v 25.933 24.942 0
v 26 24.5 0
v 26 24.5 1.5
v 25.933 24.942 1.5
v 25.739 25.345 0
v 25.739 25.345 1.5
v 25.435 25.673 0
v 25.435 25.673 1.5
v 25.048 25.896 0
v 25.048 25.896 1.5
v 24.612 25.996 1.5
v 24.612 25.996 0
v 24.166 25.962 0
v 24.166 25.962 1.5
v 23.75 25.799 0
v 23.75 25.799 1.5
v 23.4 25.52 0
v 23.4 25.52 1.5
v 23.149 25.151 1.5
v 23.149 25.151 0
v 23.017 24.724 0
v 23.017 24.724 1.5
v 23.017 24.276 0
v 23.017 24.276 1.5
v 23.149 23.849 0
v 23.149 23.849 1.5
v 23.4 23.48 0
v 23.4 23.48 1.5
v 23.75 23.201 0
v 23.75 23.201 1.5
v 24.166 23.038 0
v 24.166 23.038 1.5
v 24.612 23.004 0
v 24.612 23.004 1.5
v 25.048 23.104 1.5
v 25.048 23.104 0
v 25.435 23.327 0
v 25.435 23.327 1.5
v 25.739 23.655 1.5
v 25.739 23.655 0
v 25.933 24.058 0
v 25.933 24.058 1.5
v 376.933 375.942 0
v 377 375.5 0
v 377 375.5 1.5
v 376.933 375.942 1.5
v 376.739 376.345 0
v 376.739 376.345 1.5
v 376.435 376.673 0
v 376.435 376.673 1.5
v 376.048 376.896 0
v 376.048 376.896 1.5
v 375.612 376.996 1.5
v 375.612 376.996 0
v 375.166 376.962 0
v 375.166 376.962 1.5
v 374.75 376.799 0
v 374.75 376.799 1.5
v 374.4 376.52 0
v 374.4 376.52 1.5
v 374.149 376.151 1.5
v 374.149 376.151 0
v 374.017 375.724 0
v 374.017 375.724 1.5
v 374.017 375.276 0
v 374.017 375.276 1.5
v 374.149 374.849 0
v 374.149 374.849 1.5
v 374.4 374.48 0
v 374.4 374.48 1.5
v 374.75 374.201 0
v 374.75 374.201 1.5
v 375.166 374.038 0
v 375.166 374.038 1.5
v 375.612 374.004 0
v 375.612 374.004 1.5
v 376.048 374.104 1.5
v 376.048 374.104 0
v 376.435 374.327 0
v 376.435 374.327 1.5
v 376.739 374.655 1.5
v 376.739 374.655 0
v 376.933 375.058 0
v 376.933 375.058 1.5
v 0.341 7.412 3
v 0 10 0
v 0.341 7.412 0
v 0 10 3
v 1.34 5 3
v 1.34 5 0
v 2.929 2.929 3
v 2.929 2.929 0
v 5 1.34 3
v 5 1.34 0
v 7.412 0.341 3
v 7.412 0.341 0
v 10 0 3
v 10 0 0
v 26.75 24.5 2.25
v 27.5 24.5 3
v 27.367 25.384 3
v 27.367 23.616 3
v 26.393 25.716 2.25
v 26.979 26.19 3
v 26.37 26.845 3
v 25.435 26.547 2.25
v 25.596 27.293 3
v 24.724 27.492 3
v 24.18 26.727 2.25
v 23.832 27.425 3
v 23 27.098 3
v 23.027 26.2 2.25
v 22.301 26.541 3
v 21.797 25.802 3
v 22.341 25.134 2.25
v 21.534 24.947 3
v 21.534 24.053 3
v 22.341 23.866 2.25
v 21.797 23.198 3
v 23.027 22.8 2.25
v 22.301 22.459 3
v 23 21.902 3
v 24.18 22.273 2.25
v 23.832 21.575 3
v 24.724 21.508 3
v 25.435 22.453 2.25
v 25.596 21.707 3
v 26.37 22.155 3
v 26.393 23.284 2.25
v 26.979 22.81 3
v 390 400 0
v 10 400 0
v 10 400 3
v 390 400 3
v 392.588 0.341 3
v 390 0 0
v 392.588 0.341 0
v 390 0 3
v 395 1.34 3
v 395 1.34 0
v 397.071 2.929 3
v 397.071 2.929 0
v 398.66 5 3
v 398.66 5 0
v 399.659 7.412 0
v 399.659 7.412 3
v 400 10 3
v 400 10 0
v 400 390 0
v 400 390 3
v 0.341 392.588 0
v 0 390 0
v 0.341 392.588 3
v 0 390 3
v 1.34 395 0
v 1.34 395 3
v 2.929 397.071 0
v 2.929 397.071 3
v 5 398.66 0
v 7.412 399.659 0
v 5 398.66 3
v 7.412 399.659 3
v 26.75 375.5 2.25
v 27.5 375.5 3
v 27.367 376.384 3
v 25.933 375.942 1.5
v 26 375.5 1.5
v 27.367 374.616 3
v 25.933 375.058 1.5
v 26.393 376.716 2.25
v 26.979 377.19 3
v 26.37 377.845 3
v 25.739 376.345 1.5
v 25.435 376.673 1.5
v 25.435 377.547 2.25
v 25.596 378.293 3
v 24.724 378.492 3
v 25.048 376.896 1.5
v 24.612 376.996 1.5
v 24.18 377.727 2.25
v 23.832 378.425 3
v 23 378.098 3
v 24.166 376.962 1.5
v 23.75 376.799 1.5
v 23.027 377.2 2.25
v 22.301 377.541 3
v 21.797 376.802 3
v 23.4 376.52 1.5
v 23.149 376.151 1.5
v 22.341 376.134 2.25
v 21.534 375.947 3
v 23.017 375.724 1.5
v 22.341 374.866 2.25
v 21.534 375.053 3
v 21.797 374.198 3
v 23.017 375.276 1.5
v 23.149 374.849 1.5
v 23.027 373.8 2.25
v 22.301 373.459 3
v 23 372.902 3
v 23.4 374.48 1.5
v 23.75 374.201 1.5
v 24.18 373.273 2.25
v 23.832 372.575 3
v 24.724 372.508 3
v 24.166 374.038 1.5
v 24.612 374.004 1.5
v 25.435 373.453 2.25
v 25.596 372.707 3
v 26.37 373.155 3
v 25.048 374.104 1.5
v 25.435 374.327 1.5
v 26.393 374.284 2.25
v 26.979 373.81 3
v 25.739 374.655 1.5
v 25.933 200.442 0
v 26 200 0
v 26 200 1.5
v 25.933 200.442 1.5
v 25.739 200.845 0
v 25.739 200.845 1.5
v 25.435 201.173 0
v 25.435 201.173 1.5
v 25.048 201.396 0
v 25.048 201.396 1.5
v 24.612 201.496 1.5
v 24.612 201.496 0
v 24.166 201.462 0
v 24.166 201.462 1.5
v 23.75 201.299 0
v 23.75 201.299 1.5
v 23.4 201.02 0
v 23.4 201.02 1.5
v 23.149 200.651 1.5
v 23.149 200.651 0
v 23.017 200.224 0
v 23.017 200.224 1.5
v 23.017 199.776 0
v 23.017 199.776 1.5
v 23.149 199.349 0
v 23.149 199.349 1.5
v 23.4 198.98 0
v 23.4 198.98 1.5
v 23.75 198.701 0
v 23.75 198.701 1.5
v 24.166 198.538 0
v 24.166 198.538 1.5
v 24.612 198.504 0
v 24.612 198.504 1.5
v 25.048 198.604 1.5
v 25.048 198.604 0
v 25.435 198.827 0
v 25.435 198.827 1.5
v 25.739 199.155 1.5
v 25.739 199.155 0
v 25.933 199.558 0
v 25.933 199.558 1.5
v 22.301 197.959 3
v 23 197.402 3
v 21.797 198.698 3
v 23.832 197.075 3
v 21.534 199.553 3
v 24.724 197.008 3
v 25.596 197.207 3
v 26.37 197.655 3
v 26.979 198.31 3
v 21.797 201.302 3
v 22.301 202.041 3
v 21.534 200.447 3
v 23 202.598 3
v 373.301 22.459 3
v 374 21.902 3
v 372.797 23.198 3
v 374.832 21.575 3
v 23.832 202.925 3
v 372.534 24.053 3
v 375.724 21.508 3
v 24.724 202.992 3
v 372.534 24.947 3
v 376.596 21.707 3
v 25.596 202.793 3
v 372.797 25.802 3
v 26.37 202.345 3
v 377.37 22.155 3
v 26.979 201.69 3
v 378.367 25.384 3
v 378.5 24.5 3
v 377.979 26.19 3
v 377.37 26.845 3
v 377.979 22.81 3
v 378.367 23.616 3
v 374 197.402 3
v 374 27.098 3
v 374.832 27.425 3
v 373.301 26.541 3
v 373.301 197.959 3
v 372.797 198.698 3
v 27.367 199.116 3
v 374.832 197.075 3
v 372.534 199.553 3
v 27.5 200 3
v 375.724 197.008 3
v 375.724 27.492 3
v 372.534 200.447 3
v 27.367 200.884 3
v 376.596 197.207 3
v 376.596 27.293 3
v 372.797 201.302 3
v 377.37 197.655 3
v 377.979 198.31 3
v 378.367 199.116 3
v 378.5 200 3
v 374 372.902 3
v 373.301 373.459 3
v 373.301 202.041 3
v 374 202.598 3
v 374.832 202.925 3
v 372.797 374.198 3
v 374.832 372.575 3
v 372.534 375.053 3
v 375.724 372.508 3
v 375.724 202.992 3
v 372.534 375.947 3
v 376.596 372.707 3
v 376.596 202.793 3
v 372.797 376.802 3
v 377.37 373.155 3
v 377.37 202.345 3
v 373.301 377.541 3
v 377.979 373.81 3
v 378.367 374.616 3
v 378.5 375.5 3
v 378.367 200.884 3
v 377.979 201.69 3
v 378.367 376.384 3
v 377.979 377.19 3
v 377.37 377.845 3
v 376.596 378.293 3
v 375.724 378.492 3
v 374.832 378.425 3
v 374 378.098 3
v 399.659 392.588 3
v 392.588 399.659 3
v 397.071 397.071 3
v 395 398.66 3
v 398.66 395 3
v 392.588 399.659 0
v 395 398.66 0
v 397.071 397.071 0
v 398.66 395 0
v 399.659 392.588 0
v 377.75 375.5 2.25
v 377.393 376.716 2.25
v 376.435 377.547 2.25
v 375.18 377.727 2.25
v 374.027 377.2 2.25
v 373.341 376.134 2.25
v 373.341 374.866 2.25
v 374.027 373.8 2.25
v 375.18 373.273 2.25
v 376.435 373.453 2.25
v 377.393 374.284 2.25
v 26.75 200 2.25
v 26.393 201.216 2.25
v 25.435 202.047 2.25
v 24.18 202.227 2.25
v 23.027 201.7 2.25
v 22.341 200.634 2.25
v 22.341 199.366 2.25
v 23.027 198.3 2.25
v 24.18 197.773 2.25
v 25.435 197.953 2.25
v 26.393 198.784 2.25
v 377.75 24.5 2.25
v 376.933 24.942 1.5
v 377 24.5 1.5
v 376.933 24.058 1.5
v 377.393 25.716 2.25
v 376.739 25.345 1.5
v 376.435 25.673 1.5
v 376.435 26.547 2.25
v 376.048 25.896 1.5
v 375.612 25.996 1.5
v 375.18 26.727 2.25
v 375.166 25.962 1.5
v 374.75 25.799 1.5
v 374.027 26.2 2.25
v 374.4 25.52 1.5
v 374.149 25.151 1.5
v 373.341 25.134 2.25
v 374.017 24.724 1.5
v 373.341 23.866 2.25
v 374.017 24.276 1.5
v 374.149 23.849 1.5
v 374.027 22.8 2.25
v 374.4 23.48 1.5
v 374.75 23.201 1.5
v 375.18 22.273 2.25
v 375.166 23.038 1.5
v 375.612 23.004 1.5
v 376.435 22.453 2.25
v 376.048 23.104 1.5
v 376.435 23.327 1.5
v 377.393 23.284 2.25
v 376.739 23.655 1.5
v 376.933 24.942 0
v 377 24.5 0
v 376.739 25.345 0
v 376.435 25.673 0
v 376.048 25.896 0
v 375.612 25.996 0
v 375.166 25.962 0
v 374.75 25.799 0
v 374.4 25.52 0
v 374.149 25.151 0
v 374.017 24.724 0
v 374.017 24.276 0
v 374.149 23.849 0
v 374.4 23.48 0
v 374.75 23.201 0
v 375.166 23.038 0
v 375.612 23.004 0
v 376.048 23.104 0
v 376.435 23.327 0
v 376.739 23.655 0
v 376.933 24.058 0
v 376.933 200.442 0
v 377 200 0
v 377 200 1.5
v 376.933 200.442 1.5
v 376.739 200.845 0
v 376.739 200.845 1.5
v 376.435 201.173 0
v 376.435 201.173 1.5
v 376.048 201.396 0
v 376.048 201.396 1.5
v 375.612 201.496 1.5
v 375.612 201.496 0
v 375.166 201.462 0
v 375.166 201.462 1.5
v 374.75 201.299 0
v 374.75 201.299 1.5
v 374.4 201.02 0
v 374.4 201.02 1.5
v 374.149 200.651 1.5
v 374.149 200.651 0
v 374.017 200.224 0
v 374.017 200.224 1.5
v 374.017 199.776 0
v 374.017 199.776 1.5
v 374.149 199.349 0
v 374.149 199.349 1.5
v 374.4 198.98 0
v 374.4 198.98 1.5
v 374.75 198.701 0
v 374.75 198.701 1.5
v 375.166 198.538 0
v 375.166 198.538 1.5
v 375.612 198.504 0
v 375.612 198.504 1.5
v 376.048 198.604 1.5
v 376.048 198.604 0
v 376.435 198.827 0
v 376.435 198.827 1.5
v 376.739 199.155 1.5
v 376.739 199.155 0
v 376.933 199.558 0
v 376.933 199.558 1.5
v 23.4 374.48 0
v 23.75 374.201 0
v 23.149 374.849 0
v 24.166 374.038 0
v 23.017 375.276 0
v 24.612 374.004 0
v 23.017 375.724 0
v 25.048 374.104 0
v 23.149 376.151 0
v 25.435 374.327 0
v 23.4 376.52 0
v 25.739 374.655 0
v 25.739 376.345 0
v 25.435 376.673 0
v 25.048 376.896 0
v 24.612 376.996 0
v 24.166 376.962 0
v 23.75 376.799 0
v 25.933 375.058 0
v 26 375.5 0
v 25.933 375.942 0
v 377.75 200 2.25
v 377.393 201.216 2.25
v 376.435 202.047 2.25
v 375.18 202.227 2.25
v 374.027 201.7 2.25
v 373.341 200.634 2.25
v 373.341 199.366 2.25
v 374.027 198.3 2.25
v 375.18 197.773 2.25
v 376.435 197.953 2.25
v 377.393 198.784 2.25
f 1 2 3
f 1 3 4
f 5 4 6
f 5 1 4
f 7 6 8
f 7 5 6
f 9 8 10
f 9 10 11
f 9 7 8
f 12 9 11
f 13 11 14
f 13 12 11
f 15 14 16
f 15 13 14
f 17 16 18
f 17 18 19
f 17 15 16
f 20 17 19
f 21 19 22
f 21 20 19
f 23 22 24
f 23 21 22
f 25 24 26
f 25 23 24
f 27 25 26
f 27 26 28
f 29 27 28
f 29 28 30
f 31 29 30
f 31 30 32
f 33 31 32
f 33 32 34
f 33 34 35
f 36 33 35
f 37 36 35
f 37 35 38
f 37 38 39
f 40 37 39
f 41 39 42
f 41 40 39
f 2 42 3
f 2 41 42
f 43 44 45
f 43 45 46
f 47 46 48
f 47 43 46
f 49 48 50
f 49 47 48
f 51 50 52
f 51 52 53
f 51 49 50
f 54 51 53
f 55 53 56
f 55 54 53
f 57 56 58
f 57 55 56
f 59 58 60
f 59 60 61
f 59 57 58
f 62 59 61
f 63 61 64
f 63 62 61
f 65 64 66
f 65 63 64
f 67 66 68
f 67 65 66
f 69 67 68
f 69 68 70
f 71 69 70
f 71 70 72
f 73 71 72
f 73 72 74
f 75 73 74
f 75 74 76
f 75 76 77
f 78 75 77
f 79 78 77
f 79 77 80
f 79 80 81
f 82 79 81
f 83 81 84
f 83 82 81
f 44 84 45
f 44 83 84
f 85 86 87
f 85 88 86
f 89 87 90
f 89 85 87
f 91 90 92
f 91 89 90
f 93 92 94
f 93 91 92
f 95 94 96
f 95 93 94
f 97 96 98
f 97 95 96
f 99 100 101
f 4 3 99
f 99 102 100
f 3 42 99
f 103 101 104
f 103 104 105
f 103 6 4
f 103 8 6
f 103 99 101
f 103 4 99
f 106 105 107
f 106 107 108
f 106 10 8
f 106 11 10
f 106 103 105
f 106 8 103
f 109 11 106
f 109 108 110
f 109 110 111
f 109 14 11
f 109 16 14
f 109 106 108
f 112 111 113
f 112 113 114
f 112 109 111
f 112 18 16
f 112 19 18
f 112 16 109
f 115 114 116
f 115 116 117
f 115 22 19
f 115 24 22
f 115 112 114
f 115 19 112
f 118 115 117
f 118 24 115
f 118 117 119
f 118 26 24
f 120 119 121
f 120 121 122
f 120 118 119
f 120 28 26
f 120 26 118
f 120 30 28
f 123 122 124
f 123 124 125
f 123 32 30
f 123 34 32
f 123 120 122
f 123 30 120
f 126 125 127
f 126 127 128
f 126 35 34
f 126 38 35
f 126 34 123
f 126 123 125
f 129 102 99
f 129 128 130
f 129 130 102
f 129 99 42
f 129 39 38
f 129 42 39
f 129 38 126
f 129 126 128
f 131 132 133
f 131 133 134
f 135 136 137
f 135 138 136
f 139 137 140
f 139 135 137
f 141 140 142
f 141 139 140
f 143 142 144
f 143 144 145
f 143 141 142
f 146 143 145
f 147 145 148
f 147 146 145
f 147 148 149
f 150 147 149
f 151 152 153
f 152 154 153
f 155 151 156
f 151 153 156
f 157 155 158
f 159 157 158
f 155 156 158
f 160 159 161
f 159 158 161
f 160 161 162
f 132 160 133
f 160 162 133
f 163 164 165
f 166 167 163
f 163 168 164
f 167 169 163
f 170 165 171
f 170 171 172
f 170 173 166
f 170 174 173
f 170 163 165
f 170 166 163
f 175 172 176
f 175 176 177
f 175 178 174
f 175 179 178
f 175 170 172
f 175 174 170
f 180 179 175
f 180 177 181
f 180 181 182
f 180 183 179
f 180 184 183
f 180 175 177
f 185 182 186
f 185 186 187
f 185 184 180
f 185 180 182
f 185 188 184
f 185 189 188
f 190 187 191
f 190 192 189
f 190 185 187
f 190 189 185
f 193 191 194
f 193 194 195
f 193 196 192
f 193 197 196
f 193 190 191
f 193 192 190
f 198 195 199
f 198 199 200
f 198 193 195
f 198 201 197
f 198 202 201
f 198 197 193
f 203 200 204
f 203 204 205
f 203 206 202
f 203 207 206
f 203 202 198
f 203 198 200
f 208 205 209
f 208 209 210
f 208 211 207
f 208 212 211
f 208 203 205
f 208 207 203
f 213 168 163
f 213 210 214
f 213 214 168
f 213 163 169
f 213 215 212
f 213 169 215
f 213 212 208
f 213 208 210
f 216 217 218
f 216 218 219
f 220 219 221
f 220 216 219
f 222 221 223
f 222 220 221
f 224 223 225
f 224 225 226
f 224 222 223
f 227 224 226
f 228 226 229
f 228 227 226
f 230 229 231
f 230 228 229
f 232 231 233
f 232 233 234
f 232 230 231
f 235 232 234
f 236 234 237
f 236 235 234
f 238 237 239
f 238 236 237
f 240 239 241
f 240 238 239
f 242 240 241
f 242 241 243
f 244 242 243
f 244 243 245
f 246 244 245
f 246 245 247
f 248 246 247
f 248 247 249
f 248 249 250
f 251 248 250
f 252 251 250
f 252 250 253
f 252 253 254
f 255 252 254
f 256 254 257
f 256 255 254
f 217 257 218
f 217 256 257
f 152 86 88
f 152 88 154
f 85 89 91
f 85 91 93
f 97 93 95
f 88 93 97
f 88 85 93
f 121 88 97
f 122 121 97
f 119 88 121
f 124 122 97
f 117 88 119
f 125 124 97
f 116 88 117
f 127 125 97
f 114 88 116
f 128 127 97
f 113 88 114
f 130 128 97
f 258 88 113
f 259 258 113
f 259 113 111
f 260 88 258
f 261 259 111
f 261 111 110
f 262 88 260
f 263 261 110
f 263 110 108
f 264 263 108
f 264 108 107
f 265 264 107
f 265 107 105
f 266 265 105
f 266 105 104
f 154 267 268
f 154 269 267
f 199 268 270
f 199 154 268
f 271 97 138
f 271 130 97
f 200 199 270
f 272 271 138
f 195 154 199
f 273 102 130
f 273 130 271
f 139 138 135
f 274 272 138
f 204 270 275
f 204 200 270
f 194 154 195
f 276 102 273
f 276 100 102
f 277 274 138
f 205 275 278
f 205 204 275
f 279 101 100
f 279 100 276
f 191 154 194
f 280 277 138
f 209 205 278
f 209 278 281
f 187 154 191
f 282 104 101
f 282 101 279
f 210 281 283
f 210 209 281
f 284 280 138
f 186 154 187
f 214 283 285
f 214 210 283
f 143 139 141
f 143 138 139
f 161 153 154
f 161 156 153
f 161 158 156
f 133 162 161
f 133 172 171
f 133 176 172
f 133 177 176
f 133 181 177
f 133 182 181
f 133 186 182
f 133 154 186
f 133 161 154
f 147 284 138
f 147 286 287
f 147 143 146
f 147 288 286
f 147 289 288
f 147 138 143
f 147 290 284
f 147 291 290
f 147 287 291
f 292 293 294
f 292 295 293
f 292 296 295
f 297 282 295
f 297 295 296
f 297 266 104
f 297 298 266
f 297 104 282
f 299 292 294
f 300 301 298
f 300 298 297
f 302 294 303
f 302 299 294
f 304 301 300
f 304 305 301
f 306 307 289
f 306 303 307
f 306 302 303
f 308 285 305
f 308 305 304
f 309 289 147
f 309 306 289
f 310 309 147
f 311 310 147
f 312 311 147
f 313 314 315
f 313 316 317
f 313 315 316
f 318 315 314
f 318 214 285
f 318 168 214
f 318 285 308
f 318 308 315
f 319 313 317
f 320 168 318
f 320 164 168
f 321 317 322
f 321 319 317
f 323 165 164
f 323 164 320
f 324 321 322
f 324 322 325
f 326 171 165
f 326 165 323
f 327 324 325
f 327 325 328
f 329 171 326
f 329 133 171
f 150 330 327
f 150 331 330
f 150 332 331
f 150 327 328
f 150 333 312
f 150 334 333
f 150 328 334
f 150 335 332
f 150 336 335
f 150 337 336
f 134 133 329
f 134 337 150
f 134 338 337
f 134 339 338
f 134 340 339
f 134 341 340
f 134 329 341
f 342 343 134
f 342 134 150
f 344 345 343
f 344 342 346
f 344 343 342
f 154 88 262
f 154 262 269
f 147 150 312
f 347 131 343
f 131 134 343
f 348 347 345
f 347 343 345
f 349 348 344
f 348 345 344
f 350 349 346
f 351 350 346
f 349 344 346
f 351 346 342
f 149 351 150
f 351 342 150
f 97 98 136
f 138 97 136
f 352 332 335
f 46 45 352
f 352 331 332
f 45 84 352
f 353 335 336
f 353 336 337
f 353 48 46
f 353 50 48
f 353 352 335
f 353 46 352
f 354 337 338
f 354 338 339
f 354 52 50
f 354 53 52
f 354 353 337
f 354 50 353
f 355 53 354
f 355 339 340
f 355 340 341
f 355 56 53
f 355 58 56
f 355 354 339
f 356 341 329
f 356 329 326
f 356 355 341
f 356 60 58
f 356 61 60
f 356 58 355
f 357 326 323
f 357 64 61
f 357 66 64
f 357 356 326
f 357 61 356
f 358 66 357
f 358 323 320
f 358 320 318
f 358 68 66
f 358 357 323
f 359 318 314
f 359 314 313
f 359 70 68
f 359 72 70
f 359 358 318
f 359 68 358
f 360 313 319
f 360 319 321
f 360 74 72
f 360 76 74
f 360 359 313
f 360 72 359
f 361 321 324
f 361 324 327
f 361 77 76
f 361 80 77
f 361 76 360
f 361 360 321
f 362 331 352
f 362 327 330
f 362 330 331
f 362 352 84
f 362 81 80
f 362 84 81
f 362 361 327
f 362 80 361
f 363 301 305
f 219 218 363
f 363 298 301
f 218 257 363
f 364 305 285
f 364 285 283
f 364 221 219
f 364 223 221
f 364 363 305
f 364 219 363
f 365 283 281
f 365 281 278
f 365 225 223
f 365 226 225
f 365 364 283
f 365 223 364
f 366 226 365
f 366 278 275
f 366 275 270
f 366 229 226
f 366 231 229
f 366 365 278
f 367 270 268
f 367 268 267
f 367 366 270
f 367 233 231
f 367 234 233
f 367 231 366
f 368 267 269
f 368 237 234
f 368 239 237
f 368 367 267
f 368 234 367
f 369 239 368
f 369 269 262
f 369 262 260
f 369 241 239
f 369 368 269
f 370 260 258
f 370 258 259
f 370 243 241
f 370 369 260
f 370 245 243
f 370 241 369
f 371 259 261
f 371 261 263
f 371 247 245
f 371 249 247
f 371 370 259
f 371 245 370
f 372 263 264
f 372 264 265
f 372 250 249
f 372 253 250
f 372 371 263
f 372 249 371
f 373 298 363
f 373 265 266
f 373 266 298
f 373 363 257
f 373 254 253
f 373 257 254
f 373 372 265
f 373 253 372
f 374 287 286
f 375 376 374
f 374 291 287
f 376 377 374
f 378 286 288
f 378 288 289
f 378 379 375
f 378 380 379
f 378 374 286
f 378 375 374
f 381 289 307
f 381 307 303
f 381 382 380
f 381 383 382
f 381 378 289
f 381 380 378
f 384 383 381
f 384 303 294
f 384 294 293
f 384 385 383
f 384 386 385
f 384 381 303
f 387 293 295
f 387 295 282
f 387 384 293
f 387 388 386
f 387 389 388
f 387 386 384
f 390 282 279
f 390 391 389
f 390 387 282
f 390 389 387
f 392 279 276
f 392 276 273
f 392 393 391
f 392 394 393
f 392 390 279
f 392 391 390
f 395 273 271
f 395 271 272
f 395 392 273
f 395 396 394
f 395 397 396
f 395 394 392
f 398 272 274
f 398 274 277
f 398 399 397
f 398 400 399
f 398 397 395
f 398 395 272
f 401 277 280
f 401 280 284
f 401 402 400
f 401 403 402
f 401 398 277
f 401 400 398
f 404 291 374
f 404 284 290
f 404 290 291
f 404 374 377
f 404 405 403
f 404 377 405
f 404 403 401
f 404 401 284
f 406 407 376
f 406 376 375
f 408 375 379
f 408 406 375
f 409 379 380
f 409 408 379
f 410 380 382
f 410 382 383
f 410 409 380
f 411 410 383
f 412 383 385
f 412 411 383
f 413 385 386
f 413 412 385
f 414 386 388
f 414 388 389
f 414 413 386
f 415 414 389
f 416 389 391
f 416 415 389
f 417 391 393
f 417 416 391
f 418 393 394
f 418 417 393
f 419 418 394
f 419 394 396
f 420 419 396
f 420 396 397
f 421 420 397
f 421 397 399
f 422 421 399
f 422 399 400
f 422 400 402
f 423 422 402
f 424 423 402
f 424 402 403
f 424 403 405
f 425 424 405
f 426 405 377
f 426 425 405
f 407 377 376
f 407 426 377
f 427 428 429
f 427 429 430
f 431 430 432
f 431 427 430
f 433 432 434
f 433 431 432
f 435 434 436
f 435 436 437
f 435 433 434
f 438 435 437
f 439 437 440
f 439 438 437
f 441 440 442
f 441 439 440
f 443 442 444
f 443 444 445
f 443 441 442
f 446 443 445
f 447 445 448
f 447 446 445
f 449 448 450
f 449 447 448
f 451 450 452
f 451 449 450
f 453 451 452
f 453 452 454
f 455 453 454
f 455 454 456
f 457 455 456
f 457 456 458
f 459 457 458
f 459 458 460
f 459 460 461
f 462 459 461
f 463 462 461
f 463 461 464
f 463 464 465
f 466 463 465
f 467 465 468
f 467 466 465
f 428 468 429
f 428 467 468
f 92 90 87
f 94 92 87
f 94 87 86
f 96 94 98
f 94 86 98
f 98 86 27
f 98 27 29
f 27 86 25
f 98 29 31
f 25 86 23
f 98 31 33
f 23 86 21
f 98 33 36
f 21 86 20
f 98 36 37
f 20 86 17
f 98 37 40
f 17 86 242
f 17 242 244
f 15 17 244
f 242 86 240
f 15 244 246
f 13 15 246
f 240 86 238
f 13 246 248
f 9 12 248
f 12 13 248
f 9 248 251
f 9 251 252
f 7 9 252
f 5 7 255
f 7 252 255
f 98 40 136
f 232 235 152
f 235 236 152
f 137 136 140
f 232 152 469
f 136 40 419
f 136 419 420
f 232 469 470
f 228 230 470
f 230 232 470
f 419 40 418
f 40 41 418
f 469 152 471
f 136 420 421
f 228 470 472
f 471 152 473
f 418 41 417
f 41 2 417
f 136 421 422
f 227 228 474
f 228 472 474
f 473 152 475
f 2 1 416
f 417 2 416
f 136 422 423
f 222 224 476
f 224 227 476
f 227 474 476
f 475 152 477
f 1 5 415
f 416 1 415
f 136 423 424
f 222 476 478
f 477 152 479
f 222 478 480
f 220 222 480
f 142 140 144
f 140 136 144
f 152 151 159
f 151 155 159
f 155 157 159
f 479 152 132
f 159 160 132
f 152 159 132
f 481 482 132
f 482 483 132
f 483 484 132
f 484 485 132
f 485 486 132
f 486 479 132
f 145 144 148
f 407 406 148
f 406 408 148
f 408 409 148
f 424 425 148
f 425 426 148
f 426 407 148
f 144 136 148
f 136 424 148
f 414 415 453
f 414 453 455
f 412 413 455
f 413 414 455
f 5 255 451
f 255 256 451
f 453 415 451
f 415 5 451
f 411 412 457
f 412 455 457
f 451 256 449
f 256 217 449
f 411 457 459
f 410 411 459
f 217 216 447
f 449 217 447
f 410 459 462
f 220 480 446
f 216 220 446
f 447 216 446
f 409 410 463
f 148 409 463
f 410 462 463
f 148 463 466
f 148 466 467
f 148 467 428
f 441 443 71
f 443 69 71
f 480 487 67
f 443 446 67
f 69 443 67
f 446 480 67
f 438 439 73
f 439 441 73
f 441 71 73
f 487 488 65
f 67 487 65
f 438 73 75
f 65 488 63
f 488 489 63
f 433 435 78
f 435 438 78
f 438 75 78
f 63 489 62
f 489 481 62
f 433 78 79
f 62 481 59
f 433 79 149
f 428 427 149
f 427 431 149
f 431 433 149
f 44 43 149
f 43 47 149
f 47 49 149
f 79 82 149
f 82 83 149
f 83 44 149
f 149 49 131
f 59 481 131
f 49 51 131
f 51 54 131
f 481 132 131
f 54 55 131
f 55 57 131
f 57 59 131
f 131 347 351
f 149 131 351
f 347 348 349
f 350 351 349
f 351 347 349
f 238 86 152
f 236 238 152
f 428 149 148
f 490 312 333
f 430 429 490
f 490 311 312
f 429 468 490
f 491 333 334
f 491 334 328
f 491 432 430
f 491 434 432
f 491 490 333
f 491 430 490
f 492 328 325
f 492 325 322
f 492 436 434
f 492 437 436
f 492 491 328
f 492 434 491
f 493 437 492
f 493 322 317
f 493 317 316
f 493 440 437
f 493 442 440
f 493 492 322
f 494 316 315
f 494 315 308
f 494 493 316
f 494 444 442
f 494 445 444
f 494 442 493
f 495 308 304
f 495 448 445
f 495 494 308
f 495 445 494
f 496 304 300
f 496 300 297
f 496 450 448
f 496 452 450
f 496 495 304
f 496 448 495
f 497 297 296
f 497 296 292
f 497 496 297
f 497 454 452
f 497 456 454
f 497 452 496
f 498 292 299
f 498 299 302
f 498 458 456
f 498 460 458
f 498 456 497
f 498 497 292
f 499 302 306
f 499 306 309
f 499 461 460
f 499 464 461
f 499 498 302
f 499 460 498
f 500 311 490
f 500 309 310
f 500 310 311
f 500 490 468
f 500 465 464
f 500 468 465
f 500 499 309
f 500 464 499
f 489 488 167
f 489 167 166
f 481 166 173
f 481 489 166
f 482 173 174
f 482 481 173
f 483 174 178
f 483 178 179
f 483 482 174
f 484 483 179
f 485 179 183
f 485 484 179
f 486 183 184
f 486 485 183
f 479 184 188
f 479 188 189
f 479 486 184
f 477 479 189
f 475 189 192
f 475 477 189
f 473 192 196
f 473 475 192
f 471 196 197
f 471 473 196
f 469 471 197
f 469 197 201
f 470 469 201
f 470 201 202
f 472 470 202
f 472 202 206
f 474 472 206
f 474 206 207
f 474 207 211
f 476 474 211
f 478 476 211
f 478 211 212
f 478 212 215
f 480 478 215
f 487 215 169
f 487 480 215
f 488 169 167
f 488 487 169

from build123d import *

# Parameters (mm, degrees)
SKETCH_W     = 400
SKETCH_H     = 400
SKETCH_R     = 1.5
PAD_DEPTH    = 3
FILLET_R     = 10
CHAMFER_SIZE = 1.5


with BuildPart() as part:
    # Sketch → Pad (new body)
    with BuildSketch(Plane.XY):
        with Locations((200, 200)):
            Rectangle(SKETCH_W, SKETCH_H)
        with Locations((24.5, 375.5)):
            Circle(SKETCH_R, mode=Mode.SUBTRACT)
        with Locations((24.5, 24.5)):
            Circle(SKETCH_R, mode=Mode.SUBTRACT)
        with Locations((375.5, 24.5)):
            Circle(SKETCH_R, mode=Mode.SUBTRACT)
        with Locations((375.5, 375.5)):
            Circle(SKETCH_R, mode=Mode.SUBTRACT)
        with Locations((24.5, 200)):
            Circle(SKETCH_R, mode=Mode.SUBTRACT)
        with Locations((375.5, 200)):
            Circle(SKETCH_R, mode=Mode.SUBTRACT)
    extrude(amount=PAD_DEPTH)

    # Fillet
    fillet_edges = [part.edges().sort_by_distance(p)[0] for p in [
        (0, 0, 1.5),
        (400, 0, 1.5),
        (400, 400, 1.5),
        (0, 400, 1.5),
    ]]
    fillet(fillet_edges, radius=FILLET_R)

    # Chamfer
    chamfer_edges = [part.edges().sort_by_distance(p)[0] for p in [
        (23, 375.5, 3),
        (23, 200, 3),
        (374, 200, 3),
        (374, 375.5, 3),
        (374, 24.5, 3),
        (23, 24.5, 3),
    ]]
    chamfer(chamfer_edges, length=CHAMFER_SIZE)


solid = part.part
